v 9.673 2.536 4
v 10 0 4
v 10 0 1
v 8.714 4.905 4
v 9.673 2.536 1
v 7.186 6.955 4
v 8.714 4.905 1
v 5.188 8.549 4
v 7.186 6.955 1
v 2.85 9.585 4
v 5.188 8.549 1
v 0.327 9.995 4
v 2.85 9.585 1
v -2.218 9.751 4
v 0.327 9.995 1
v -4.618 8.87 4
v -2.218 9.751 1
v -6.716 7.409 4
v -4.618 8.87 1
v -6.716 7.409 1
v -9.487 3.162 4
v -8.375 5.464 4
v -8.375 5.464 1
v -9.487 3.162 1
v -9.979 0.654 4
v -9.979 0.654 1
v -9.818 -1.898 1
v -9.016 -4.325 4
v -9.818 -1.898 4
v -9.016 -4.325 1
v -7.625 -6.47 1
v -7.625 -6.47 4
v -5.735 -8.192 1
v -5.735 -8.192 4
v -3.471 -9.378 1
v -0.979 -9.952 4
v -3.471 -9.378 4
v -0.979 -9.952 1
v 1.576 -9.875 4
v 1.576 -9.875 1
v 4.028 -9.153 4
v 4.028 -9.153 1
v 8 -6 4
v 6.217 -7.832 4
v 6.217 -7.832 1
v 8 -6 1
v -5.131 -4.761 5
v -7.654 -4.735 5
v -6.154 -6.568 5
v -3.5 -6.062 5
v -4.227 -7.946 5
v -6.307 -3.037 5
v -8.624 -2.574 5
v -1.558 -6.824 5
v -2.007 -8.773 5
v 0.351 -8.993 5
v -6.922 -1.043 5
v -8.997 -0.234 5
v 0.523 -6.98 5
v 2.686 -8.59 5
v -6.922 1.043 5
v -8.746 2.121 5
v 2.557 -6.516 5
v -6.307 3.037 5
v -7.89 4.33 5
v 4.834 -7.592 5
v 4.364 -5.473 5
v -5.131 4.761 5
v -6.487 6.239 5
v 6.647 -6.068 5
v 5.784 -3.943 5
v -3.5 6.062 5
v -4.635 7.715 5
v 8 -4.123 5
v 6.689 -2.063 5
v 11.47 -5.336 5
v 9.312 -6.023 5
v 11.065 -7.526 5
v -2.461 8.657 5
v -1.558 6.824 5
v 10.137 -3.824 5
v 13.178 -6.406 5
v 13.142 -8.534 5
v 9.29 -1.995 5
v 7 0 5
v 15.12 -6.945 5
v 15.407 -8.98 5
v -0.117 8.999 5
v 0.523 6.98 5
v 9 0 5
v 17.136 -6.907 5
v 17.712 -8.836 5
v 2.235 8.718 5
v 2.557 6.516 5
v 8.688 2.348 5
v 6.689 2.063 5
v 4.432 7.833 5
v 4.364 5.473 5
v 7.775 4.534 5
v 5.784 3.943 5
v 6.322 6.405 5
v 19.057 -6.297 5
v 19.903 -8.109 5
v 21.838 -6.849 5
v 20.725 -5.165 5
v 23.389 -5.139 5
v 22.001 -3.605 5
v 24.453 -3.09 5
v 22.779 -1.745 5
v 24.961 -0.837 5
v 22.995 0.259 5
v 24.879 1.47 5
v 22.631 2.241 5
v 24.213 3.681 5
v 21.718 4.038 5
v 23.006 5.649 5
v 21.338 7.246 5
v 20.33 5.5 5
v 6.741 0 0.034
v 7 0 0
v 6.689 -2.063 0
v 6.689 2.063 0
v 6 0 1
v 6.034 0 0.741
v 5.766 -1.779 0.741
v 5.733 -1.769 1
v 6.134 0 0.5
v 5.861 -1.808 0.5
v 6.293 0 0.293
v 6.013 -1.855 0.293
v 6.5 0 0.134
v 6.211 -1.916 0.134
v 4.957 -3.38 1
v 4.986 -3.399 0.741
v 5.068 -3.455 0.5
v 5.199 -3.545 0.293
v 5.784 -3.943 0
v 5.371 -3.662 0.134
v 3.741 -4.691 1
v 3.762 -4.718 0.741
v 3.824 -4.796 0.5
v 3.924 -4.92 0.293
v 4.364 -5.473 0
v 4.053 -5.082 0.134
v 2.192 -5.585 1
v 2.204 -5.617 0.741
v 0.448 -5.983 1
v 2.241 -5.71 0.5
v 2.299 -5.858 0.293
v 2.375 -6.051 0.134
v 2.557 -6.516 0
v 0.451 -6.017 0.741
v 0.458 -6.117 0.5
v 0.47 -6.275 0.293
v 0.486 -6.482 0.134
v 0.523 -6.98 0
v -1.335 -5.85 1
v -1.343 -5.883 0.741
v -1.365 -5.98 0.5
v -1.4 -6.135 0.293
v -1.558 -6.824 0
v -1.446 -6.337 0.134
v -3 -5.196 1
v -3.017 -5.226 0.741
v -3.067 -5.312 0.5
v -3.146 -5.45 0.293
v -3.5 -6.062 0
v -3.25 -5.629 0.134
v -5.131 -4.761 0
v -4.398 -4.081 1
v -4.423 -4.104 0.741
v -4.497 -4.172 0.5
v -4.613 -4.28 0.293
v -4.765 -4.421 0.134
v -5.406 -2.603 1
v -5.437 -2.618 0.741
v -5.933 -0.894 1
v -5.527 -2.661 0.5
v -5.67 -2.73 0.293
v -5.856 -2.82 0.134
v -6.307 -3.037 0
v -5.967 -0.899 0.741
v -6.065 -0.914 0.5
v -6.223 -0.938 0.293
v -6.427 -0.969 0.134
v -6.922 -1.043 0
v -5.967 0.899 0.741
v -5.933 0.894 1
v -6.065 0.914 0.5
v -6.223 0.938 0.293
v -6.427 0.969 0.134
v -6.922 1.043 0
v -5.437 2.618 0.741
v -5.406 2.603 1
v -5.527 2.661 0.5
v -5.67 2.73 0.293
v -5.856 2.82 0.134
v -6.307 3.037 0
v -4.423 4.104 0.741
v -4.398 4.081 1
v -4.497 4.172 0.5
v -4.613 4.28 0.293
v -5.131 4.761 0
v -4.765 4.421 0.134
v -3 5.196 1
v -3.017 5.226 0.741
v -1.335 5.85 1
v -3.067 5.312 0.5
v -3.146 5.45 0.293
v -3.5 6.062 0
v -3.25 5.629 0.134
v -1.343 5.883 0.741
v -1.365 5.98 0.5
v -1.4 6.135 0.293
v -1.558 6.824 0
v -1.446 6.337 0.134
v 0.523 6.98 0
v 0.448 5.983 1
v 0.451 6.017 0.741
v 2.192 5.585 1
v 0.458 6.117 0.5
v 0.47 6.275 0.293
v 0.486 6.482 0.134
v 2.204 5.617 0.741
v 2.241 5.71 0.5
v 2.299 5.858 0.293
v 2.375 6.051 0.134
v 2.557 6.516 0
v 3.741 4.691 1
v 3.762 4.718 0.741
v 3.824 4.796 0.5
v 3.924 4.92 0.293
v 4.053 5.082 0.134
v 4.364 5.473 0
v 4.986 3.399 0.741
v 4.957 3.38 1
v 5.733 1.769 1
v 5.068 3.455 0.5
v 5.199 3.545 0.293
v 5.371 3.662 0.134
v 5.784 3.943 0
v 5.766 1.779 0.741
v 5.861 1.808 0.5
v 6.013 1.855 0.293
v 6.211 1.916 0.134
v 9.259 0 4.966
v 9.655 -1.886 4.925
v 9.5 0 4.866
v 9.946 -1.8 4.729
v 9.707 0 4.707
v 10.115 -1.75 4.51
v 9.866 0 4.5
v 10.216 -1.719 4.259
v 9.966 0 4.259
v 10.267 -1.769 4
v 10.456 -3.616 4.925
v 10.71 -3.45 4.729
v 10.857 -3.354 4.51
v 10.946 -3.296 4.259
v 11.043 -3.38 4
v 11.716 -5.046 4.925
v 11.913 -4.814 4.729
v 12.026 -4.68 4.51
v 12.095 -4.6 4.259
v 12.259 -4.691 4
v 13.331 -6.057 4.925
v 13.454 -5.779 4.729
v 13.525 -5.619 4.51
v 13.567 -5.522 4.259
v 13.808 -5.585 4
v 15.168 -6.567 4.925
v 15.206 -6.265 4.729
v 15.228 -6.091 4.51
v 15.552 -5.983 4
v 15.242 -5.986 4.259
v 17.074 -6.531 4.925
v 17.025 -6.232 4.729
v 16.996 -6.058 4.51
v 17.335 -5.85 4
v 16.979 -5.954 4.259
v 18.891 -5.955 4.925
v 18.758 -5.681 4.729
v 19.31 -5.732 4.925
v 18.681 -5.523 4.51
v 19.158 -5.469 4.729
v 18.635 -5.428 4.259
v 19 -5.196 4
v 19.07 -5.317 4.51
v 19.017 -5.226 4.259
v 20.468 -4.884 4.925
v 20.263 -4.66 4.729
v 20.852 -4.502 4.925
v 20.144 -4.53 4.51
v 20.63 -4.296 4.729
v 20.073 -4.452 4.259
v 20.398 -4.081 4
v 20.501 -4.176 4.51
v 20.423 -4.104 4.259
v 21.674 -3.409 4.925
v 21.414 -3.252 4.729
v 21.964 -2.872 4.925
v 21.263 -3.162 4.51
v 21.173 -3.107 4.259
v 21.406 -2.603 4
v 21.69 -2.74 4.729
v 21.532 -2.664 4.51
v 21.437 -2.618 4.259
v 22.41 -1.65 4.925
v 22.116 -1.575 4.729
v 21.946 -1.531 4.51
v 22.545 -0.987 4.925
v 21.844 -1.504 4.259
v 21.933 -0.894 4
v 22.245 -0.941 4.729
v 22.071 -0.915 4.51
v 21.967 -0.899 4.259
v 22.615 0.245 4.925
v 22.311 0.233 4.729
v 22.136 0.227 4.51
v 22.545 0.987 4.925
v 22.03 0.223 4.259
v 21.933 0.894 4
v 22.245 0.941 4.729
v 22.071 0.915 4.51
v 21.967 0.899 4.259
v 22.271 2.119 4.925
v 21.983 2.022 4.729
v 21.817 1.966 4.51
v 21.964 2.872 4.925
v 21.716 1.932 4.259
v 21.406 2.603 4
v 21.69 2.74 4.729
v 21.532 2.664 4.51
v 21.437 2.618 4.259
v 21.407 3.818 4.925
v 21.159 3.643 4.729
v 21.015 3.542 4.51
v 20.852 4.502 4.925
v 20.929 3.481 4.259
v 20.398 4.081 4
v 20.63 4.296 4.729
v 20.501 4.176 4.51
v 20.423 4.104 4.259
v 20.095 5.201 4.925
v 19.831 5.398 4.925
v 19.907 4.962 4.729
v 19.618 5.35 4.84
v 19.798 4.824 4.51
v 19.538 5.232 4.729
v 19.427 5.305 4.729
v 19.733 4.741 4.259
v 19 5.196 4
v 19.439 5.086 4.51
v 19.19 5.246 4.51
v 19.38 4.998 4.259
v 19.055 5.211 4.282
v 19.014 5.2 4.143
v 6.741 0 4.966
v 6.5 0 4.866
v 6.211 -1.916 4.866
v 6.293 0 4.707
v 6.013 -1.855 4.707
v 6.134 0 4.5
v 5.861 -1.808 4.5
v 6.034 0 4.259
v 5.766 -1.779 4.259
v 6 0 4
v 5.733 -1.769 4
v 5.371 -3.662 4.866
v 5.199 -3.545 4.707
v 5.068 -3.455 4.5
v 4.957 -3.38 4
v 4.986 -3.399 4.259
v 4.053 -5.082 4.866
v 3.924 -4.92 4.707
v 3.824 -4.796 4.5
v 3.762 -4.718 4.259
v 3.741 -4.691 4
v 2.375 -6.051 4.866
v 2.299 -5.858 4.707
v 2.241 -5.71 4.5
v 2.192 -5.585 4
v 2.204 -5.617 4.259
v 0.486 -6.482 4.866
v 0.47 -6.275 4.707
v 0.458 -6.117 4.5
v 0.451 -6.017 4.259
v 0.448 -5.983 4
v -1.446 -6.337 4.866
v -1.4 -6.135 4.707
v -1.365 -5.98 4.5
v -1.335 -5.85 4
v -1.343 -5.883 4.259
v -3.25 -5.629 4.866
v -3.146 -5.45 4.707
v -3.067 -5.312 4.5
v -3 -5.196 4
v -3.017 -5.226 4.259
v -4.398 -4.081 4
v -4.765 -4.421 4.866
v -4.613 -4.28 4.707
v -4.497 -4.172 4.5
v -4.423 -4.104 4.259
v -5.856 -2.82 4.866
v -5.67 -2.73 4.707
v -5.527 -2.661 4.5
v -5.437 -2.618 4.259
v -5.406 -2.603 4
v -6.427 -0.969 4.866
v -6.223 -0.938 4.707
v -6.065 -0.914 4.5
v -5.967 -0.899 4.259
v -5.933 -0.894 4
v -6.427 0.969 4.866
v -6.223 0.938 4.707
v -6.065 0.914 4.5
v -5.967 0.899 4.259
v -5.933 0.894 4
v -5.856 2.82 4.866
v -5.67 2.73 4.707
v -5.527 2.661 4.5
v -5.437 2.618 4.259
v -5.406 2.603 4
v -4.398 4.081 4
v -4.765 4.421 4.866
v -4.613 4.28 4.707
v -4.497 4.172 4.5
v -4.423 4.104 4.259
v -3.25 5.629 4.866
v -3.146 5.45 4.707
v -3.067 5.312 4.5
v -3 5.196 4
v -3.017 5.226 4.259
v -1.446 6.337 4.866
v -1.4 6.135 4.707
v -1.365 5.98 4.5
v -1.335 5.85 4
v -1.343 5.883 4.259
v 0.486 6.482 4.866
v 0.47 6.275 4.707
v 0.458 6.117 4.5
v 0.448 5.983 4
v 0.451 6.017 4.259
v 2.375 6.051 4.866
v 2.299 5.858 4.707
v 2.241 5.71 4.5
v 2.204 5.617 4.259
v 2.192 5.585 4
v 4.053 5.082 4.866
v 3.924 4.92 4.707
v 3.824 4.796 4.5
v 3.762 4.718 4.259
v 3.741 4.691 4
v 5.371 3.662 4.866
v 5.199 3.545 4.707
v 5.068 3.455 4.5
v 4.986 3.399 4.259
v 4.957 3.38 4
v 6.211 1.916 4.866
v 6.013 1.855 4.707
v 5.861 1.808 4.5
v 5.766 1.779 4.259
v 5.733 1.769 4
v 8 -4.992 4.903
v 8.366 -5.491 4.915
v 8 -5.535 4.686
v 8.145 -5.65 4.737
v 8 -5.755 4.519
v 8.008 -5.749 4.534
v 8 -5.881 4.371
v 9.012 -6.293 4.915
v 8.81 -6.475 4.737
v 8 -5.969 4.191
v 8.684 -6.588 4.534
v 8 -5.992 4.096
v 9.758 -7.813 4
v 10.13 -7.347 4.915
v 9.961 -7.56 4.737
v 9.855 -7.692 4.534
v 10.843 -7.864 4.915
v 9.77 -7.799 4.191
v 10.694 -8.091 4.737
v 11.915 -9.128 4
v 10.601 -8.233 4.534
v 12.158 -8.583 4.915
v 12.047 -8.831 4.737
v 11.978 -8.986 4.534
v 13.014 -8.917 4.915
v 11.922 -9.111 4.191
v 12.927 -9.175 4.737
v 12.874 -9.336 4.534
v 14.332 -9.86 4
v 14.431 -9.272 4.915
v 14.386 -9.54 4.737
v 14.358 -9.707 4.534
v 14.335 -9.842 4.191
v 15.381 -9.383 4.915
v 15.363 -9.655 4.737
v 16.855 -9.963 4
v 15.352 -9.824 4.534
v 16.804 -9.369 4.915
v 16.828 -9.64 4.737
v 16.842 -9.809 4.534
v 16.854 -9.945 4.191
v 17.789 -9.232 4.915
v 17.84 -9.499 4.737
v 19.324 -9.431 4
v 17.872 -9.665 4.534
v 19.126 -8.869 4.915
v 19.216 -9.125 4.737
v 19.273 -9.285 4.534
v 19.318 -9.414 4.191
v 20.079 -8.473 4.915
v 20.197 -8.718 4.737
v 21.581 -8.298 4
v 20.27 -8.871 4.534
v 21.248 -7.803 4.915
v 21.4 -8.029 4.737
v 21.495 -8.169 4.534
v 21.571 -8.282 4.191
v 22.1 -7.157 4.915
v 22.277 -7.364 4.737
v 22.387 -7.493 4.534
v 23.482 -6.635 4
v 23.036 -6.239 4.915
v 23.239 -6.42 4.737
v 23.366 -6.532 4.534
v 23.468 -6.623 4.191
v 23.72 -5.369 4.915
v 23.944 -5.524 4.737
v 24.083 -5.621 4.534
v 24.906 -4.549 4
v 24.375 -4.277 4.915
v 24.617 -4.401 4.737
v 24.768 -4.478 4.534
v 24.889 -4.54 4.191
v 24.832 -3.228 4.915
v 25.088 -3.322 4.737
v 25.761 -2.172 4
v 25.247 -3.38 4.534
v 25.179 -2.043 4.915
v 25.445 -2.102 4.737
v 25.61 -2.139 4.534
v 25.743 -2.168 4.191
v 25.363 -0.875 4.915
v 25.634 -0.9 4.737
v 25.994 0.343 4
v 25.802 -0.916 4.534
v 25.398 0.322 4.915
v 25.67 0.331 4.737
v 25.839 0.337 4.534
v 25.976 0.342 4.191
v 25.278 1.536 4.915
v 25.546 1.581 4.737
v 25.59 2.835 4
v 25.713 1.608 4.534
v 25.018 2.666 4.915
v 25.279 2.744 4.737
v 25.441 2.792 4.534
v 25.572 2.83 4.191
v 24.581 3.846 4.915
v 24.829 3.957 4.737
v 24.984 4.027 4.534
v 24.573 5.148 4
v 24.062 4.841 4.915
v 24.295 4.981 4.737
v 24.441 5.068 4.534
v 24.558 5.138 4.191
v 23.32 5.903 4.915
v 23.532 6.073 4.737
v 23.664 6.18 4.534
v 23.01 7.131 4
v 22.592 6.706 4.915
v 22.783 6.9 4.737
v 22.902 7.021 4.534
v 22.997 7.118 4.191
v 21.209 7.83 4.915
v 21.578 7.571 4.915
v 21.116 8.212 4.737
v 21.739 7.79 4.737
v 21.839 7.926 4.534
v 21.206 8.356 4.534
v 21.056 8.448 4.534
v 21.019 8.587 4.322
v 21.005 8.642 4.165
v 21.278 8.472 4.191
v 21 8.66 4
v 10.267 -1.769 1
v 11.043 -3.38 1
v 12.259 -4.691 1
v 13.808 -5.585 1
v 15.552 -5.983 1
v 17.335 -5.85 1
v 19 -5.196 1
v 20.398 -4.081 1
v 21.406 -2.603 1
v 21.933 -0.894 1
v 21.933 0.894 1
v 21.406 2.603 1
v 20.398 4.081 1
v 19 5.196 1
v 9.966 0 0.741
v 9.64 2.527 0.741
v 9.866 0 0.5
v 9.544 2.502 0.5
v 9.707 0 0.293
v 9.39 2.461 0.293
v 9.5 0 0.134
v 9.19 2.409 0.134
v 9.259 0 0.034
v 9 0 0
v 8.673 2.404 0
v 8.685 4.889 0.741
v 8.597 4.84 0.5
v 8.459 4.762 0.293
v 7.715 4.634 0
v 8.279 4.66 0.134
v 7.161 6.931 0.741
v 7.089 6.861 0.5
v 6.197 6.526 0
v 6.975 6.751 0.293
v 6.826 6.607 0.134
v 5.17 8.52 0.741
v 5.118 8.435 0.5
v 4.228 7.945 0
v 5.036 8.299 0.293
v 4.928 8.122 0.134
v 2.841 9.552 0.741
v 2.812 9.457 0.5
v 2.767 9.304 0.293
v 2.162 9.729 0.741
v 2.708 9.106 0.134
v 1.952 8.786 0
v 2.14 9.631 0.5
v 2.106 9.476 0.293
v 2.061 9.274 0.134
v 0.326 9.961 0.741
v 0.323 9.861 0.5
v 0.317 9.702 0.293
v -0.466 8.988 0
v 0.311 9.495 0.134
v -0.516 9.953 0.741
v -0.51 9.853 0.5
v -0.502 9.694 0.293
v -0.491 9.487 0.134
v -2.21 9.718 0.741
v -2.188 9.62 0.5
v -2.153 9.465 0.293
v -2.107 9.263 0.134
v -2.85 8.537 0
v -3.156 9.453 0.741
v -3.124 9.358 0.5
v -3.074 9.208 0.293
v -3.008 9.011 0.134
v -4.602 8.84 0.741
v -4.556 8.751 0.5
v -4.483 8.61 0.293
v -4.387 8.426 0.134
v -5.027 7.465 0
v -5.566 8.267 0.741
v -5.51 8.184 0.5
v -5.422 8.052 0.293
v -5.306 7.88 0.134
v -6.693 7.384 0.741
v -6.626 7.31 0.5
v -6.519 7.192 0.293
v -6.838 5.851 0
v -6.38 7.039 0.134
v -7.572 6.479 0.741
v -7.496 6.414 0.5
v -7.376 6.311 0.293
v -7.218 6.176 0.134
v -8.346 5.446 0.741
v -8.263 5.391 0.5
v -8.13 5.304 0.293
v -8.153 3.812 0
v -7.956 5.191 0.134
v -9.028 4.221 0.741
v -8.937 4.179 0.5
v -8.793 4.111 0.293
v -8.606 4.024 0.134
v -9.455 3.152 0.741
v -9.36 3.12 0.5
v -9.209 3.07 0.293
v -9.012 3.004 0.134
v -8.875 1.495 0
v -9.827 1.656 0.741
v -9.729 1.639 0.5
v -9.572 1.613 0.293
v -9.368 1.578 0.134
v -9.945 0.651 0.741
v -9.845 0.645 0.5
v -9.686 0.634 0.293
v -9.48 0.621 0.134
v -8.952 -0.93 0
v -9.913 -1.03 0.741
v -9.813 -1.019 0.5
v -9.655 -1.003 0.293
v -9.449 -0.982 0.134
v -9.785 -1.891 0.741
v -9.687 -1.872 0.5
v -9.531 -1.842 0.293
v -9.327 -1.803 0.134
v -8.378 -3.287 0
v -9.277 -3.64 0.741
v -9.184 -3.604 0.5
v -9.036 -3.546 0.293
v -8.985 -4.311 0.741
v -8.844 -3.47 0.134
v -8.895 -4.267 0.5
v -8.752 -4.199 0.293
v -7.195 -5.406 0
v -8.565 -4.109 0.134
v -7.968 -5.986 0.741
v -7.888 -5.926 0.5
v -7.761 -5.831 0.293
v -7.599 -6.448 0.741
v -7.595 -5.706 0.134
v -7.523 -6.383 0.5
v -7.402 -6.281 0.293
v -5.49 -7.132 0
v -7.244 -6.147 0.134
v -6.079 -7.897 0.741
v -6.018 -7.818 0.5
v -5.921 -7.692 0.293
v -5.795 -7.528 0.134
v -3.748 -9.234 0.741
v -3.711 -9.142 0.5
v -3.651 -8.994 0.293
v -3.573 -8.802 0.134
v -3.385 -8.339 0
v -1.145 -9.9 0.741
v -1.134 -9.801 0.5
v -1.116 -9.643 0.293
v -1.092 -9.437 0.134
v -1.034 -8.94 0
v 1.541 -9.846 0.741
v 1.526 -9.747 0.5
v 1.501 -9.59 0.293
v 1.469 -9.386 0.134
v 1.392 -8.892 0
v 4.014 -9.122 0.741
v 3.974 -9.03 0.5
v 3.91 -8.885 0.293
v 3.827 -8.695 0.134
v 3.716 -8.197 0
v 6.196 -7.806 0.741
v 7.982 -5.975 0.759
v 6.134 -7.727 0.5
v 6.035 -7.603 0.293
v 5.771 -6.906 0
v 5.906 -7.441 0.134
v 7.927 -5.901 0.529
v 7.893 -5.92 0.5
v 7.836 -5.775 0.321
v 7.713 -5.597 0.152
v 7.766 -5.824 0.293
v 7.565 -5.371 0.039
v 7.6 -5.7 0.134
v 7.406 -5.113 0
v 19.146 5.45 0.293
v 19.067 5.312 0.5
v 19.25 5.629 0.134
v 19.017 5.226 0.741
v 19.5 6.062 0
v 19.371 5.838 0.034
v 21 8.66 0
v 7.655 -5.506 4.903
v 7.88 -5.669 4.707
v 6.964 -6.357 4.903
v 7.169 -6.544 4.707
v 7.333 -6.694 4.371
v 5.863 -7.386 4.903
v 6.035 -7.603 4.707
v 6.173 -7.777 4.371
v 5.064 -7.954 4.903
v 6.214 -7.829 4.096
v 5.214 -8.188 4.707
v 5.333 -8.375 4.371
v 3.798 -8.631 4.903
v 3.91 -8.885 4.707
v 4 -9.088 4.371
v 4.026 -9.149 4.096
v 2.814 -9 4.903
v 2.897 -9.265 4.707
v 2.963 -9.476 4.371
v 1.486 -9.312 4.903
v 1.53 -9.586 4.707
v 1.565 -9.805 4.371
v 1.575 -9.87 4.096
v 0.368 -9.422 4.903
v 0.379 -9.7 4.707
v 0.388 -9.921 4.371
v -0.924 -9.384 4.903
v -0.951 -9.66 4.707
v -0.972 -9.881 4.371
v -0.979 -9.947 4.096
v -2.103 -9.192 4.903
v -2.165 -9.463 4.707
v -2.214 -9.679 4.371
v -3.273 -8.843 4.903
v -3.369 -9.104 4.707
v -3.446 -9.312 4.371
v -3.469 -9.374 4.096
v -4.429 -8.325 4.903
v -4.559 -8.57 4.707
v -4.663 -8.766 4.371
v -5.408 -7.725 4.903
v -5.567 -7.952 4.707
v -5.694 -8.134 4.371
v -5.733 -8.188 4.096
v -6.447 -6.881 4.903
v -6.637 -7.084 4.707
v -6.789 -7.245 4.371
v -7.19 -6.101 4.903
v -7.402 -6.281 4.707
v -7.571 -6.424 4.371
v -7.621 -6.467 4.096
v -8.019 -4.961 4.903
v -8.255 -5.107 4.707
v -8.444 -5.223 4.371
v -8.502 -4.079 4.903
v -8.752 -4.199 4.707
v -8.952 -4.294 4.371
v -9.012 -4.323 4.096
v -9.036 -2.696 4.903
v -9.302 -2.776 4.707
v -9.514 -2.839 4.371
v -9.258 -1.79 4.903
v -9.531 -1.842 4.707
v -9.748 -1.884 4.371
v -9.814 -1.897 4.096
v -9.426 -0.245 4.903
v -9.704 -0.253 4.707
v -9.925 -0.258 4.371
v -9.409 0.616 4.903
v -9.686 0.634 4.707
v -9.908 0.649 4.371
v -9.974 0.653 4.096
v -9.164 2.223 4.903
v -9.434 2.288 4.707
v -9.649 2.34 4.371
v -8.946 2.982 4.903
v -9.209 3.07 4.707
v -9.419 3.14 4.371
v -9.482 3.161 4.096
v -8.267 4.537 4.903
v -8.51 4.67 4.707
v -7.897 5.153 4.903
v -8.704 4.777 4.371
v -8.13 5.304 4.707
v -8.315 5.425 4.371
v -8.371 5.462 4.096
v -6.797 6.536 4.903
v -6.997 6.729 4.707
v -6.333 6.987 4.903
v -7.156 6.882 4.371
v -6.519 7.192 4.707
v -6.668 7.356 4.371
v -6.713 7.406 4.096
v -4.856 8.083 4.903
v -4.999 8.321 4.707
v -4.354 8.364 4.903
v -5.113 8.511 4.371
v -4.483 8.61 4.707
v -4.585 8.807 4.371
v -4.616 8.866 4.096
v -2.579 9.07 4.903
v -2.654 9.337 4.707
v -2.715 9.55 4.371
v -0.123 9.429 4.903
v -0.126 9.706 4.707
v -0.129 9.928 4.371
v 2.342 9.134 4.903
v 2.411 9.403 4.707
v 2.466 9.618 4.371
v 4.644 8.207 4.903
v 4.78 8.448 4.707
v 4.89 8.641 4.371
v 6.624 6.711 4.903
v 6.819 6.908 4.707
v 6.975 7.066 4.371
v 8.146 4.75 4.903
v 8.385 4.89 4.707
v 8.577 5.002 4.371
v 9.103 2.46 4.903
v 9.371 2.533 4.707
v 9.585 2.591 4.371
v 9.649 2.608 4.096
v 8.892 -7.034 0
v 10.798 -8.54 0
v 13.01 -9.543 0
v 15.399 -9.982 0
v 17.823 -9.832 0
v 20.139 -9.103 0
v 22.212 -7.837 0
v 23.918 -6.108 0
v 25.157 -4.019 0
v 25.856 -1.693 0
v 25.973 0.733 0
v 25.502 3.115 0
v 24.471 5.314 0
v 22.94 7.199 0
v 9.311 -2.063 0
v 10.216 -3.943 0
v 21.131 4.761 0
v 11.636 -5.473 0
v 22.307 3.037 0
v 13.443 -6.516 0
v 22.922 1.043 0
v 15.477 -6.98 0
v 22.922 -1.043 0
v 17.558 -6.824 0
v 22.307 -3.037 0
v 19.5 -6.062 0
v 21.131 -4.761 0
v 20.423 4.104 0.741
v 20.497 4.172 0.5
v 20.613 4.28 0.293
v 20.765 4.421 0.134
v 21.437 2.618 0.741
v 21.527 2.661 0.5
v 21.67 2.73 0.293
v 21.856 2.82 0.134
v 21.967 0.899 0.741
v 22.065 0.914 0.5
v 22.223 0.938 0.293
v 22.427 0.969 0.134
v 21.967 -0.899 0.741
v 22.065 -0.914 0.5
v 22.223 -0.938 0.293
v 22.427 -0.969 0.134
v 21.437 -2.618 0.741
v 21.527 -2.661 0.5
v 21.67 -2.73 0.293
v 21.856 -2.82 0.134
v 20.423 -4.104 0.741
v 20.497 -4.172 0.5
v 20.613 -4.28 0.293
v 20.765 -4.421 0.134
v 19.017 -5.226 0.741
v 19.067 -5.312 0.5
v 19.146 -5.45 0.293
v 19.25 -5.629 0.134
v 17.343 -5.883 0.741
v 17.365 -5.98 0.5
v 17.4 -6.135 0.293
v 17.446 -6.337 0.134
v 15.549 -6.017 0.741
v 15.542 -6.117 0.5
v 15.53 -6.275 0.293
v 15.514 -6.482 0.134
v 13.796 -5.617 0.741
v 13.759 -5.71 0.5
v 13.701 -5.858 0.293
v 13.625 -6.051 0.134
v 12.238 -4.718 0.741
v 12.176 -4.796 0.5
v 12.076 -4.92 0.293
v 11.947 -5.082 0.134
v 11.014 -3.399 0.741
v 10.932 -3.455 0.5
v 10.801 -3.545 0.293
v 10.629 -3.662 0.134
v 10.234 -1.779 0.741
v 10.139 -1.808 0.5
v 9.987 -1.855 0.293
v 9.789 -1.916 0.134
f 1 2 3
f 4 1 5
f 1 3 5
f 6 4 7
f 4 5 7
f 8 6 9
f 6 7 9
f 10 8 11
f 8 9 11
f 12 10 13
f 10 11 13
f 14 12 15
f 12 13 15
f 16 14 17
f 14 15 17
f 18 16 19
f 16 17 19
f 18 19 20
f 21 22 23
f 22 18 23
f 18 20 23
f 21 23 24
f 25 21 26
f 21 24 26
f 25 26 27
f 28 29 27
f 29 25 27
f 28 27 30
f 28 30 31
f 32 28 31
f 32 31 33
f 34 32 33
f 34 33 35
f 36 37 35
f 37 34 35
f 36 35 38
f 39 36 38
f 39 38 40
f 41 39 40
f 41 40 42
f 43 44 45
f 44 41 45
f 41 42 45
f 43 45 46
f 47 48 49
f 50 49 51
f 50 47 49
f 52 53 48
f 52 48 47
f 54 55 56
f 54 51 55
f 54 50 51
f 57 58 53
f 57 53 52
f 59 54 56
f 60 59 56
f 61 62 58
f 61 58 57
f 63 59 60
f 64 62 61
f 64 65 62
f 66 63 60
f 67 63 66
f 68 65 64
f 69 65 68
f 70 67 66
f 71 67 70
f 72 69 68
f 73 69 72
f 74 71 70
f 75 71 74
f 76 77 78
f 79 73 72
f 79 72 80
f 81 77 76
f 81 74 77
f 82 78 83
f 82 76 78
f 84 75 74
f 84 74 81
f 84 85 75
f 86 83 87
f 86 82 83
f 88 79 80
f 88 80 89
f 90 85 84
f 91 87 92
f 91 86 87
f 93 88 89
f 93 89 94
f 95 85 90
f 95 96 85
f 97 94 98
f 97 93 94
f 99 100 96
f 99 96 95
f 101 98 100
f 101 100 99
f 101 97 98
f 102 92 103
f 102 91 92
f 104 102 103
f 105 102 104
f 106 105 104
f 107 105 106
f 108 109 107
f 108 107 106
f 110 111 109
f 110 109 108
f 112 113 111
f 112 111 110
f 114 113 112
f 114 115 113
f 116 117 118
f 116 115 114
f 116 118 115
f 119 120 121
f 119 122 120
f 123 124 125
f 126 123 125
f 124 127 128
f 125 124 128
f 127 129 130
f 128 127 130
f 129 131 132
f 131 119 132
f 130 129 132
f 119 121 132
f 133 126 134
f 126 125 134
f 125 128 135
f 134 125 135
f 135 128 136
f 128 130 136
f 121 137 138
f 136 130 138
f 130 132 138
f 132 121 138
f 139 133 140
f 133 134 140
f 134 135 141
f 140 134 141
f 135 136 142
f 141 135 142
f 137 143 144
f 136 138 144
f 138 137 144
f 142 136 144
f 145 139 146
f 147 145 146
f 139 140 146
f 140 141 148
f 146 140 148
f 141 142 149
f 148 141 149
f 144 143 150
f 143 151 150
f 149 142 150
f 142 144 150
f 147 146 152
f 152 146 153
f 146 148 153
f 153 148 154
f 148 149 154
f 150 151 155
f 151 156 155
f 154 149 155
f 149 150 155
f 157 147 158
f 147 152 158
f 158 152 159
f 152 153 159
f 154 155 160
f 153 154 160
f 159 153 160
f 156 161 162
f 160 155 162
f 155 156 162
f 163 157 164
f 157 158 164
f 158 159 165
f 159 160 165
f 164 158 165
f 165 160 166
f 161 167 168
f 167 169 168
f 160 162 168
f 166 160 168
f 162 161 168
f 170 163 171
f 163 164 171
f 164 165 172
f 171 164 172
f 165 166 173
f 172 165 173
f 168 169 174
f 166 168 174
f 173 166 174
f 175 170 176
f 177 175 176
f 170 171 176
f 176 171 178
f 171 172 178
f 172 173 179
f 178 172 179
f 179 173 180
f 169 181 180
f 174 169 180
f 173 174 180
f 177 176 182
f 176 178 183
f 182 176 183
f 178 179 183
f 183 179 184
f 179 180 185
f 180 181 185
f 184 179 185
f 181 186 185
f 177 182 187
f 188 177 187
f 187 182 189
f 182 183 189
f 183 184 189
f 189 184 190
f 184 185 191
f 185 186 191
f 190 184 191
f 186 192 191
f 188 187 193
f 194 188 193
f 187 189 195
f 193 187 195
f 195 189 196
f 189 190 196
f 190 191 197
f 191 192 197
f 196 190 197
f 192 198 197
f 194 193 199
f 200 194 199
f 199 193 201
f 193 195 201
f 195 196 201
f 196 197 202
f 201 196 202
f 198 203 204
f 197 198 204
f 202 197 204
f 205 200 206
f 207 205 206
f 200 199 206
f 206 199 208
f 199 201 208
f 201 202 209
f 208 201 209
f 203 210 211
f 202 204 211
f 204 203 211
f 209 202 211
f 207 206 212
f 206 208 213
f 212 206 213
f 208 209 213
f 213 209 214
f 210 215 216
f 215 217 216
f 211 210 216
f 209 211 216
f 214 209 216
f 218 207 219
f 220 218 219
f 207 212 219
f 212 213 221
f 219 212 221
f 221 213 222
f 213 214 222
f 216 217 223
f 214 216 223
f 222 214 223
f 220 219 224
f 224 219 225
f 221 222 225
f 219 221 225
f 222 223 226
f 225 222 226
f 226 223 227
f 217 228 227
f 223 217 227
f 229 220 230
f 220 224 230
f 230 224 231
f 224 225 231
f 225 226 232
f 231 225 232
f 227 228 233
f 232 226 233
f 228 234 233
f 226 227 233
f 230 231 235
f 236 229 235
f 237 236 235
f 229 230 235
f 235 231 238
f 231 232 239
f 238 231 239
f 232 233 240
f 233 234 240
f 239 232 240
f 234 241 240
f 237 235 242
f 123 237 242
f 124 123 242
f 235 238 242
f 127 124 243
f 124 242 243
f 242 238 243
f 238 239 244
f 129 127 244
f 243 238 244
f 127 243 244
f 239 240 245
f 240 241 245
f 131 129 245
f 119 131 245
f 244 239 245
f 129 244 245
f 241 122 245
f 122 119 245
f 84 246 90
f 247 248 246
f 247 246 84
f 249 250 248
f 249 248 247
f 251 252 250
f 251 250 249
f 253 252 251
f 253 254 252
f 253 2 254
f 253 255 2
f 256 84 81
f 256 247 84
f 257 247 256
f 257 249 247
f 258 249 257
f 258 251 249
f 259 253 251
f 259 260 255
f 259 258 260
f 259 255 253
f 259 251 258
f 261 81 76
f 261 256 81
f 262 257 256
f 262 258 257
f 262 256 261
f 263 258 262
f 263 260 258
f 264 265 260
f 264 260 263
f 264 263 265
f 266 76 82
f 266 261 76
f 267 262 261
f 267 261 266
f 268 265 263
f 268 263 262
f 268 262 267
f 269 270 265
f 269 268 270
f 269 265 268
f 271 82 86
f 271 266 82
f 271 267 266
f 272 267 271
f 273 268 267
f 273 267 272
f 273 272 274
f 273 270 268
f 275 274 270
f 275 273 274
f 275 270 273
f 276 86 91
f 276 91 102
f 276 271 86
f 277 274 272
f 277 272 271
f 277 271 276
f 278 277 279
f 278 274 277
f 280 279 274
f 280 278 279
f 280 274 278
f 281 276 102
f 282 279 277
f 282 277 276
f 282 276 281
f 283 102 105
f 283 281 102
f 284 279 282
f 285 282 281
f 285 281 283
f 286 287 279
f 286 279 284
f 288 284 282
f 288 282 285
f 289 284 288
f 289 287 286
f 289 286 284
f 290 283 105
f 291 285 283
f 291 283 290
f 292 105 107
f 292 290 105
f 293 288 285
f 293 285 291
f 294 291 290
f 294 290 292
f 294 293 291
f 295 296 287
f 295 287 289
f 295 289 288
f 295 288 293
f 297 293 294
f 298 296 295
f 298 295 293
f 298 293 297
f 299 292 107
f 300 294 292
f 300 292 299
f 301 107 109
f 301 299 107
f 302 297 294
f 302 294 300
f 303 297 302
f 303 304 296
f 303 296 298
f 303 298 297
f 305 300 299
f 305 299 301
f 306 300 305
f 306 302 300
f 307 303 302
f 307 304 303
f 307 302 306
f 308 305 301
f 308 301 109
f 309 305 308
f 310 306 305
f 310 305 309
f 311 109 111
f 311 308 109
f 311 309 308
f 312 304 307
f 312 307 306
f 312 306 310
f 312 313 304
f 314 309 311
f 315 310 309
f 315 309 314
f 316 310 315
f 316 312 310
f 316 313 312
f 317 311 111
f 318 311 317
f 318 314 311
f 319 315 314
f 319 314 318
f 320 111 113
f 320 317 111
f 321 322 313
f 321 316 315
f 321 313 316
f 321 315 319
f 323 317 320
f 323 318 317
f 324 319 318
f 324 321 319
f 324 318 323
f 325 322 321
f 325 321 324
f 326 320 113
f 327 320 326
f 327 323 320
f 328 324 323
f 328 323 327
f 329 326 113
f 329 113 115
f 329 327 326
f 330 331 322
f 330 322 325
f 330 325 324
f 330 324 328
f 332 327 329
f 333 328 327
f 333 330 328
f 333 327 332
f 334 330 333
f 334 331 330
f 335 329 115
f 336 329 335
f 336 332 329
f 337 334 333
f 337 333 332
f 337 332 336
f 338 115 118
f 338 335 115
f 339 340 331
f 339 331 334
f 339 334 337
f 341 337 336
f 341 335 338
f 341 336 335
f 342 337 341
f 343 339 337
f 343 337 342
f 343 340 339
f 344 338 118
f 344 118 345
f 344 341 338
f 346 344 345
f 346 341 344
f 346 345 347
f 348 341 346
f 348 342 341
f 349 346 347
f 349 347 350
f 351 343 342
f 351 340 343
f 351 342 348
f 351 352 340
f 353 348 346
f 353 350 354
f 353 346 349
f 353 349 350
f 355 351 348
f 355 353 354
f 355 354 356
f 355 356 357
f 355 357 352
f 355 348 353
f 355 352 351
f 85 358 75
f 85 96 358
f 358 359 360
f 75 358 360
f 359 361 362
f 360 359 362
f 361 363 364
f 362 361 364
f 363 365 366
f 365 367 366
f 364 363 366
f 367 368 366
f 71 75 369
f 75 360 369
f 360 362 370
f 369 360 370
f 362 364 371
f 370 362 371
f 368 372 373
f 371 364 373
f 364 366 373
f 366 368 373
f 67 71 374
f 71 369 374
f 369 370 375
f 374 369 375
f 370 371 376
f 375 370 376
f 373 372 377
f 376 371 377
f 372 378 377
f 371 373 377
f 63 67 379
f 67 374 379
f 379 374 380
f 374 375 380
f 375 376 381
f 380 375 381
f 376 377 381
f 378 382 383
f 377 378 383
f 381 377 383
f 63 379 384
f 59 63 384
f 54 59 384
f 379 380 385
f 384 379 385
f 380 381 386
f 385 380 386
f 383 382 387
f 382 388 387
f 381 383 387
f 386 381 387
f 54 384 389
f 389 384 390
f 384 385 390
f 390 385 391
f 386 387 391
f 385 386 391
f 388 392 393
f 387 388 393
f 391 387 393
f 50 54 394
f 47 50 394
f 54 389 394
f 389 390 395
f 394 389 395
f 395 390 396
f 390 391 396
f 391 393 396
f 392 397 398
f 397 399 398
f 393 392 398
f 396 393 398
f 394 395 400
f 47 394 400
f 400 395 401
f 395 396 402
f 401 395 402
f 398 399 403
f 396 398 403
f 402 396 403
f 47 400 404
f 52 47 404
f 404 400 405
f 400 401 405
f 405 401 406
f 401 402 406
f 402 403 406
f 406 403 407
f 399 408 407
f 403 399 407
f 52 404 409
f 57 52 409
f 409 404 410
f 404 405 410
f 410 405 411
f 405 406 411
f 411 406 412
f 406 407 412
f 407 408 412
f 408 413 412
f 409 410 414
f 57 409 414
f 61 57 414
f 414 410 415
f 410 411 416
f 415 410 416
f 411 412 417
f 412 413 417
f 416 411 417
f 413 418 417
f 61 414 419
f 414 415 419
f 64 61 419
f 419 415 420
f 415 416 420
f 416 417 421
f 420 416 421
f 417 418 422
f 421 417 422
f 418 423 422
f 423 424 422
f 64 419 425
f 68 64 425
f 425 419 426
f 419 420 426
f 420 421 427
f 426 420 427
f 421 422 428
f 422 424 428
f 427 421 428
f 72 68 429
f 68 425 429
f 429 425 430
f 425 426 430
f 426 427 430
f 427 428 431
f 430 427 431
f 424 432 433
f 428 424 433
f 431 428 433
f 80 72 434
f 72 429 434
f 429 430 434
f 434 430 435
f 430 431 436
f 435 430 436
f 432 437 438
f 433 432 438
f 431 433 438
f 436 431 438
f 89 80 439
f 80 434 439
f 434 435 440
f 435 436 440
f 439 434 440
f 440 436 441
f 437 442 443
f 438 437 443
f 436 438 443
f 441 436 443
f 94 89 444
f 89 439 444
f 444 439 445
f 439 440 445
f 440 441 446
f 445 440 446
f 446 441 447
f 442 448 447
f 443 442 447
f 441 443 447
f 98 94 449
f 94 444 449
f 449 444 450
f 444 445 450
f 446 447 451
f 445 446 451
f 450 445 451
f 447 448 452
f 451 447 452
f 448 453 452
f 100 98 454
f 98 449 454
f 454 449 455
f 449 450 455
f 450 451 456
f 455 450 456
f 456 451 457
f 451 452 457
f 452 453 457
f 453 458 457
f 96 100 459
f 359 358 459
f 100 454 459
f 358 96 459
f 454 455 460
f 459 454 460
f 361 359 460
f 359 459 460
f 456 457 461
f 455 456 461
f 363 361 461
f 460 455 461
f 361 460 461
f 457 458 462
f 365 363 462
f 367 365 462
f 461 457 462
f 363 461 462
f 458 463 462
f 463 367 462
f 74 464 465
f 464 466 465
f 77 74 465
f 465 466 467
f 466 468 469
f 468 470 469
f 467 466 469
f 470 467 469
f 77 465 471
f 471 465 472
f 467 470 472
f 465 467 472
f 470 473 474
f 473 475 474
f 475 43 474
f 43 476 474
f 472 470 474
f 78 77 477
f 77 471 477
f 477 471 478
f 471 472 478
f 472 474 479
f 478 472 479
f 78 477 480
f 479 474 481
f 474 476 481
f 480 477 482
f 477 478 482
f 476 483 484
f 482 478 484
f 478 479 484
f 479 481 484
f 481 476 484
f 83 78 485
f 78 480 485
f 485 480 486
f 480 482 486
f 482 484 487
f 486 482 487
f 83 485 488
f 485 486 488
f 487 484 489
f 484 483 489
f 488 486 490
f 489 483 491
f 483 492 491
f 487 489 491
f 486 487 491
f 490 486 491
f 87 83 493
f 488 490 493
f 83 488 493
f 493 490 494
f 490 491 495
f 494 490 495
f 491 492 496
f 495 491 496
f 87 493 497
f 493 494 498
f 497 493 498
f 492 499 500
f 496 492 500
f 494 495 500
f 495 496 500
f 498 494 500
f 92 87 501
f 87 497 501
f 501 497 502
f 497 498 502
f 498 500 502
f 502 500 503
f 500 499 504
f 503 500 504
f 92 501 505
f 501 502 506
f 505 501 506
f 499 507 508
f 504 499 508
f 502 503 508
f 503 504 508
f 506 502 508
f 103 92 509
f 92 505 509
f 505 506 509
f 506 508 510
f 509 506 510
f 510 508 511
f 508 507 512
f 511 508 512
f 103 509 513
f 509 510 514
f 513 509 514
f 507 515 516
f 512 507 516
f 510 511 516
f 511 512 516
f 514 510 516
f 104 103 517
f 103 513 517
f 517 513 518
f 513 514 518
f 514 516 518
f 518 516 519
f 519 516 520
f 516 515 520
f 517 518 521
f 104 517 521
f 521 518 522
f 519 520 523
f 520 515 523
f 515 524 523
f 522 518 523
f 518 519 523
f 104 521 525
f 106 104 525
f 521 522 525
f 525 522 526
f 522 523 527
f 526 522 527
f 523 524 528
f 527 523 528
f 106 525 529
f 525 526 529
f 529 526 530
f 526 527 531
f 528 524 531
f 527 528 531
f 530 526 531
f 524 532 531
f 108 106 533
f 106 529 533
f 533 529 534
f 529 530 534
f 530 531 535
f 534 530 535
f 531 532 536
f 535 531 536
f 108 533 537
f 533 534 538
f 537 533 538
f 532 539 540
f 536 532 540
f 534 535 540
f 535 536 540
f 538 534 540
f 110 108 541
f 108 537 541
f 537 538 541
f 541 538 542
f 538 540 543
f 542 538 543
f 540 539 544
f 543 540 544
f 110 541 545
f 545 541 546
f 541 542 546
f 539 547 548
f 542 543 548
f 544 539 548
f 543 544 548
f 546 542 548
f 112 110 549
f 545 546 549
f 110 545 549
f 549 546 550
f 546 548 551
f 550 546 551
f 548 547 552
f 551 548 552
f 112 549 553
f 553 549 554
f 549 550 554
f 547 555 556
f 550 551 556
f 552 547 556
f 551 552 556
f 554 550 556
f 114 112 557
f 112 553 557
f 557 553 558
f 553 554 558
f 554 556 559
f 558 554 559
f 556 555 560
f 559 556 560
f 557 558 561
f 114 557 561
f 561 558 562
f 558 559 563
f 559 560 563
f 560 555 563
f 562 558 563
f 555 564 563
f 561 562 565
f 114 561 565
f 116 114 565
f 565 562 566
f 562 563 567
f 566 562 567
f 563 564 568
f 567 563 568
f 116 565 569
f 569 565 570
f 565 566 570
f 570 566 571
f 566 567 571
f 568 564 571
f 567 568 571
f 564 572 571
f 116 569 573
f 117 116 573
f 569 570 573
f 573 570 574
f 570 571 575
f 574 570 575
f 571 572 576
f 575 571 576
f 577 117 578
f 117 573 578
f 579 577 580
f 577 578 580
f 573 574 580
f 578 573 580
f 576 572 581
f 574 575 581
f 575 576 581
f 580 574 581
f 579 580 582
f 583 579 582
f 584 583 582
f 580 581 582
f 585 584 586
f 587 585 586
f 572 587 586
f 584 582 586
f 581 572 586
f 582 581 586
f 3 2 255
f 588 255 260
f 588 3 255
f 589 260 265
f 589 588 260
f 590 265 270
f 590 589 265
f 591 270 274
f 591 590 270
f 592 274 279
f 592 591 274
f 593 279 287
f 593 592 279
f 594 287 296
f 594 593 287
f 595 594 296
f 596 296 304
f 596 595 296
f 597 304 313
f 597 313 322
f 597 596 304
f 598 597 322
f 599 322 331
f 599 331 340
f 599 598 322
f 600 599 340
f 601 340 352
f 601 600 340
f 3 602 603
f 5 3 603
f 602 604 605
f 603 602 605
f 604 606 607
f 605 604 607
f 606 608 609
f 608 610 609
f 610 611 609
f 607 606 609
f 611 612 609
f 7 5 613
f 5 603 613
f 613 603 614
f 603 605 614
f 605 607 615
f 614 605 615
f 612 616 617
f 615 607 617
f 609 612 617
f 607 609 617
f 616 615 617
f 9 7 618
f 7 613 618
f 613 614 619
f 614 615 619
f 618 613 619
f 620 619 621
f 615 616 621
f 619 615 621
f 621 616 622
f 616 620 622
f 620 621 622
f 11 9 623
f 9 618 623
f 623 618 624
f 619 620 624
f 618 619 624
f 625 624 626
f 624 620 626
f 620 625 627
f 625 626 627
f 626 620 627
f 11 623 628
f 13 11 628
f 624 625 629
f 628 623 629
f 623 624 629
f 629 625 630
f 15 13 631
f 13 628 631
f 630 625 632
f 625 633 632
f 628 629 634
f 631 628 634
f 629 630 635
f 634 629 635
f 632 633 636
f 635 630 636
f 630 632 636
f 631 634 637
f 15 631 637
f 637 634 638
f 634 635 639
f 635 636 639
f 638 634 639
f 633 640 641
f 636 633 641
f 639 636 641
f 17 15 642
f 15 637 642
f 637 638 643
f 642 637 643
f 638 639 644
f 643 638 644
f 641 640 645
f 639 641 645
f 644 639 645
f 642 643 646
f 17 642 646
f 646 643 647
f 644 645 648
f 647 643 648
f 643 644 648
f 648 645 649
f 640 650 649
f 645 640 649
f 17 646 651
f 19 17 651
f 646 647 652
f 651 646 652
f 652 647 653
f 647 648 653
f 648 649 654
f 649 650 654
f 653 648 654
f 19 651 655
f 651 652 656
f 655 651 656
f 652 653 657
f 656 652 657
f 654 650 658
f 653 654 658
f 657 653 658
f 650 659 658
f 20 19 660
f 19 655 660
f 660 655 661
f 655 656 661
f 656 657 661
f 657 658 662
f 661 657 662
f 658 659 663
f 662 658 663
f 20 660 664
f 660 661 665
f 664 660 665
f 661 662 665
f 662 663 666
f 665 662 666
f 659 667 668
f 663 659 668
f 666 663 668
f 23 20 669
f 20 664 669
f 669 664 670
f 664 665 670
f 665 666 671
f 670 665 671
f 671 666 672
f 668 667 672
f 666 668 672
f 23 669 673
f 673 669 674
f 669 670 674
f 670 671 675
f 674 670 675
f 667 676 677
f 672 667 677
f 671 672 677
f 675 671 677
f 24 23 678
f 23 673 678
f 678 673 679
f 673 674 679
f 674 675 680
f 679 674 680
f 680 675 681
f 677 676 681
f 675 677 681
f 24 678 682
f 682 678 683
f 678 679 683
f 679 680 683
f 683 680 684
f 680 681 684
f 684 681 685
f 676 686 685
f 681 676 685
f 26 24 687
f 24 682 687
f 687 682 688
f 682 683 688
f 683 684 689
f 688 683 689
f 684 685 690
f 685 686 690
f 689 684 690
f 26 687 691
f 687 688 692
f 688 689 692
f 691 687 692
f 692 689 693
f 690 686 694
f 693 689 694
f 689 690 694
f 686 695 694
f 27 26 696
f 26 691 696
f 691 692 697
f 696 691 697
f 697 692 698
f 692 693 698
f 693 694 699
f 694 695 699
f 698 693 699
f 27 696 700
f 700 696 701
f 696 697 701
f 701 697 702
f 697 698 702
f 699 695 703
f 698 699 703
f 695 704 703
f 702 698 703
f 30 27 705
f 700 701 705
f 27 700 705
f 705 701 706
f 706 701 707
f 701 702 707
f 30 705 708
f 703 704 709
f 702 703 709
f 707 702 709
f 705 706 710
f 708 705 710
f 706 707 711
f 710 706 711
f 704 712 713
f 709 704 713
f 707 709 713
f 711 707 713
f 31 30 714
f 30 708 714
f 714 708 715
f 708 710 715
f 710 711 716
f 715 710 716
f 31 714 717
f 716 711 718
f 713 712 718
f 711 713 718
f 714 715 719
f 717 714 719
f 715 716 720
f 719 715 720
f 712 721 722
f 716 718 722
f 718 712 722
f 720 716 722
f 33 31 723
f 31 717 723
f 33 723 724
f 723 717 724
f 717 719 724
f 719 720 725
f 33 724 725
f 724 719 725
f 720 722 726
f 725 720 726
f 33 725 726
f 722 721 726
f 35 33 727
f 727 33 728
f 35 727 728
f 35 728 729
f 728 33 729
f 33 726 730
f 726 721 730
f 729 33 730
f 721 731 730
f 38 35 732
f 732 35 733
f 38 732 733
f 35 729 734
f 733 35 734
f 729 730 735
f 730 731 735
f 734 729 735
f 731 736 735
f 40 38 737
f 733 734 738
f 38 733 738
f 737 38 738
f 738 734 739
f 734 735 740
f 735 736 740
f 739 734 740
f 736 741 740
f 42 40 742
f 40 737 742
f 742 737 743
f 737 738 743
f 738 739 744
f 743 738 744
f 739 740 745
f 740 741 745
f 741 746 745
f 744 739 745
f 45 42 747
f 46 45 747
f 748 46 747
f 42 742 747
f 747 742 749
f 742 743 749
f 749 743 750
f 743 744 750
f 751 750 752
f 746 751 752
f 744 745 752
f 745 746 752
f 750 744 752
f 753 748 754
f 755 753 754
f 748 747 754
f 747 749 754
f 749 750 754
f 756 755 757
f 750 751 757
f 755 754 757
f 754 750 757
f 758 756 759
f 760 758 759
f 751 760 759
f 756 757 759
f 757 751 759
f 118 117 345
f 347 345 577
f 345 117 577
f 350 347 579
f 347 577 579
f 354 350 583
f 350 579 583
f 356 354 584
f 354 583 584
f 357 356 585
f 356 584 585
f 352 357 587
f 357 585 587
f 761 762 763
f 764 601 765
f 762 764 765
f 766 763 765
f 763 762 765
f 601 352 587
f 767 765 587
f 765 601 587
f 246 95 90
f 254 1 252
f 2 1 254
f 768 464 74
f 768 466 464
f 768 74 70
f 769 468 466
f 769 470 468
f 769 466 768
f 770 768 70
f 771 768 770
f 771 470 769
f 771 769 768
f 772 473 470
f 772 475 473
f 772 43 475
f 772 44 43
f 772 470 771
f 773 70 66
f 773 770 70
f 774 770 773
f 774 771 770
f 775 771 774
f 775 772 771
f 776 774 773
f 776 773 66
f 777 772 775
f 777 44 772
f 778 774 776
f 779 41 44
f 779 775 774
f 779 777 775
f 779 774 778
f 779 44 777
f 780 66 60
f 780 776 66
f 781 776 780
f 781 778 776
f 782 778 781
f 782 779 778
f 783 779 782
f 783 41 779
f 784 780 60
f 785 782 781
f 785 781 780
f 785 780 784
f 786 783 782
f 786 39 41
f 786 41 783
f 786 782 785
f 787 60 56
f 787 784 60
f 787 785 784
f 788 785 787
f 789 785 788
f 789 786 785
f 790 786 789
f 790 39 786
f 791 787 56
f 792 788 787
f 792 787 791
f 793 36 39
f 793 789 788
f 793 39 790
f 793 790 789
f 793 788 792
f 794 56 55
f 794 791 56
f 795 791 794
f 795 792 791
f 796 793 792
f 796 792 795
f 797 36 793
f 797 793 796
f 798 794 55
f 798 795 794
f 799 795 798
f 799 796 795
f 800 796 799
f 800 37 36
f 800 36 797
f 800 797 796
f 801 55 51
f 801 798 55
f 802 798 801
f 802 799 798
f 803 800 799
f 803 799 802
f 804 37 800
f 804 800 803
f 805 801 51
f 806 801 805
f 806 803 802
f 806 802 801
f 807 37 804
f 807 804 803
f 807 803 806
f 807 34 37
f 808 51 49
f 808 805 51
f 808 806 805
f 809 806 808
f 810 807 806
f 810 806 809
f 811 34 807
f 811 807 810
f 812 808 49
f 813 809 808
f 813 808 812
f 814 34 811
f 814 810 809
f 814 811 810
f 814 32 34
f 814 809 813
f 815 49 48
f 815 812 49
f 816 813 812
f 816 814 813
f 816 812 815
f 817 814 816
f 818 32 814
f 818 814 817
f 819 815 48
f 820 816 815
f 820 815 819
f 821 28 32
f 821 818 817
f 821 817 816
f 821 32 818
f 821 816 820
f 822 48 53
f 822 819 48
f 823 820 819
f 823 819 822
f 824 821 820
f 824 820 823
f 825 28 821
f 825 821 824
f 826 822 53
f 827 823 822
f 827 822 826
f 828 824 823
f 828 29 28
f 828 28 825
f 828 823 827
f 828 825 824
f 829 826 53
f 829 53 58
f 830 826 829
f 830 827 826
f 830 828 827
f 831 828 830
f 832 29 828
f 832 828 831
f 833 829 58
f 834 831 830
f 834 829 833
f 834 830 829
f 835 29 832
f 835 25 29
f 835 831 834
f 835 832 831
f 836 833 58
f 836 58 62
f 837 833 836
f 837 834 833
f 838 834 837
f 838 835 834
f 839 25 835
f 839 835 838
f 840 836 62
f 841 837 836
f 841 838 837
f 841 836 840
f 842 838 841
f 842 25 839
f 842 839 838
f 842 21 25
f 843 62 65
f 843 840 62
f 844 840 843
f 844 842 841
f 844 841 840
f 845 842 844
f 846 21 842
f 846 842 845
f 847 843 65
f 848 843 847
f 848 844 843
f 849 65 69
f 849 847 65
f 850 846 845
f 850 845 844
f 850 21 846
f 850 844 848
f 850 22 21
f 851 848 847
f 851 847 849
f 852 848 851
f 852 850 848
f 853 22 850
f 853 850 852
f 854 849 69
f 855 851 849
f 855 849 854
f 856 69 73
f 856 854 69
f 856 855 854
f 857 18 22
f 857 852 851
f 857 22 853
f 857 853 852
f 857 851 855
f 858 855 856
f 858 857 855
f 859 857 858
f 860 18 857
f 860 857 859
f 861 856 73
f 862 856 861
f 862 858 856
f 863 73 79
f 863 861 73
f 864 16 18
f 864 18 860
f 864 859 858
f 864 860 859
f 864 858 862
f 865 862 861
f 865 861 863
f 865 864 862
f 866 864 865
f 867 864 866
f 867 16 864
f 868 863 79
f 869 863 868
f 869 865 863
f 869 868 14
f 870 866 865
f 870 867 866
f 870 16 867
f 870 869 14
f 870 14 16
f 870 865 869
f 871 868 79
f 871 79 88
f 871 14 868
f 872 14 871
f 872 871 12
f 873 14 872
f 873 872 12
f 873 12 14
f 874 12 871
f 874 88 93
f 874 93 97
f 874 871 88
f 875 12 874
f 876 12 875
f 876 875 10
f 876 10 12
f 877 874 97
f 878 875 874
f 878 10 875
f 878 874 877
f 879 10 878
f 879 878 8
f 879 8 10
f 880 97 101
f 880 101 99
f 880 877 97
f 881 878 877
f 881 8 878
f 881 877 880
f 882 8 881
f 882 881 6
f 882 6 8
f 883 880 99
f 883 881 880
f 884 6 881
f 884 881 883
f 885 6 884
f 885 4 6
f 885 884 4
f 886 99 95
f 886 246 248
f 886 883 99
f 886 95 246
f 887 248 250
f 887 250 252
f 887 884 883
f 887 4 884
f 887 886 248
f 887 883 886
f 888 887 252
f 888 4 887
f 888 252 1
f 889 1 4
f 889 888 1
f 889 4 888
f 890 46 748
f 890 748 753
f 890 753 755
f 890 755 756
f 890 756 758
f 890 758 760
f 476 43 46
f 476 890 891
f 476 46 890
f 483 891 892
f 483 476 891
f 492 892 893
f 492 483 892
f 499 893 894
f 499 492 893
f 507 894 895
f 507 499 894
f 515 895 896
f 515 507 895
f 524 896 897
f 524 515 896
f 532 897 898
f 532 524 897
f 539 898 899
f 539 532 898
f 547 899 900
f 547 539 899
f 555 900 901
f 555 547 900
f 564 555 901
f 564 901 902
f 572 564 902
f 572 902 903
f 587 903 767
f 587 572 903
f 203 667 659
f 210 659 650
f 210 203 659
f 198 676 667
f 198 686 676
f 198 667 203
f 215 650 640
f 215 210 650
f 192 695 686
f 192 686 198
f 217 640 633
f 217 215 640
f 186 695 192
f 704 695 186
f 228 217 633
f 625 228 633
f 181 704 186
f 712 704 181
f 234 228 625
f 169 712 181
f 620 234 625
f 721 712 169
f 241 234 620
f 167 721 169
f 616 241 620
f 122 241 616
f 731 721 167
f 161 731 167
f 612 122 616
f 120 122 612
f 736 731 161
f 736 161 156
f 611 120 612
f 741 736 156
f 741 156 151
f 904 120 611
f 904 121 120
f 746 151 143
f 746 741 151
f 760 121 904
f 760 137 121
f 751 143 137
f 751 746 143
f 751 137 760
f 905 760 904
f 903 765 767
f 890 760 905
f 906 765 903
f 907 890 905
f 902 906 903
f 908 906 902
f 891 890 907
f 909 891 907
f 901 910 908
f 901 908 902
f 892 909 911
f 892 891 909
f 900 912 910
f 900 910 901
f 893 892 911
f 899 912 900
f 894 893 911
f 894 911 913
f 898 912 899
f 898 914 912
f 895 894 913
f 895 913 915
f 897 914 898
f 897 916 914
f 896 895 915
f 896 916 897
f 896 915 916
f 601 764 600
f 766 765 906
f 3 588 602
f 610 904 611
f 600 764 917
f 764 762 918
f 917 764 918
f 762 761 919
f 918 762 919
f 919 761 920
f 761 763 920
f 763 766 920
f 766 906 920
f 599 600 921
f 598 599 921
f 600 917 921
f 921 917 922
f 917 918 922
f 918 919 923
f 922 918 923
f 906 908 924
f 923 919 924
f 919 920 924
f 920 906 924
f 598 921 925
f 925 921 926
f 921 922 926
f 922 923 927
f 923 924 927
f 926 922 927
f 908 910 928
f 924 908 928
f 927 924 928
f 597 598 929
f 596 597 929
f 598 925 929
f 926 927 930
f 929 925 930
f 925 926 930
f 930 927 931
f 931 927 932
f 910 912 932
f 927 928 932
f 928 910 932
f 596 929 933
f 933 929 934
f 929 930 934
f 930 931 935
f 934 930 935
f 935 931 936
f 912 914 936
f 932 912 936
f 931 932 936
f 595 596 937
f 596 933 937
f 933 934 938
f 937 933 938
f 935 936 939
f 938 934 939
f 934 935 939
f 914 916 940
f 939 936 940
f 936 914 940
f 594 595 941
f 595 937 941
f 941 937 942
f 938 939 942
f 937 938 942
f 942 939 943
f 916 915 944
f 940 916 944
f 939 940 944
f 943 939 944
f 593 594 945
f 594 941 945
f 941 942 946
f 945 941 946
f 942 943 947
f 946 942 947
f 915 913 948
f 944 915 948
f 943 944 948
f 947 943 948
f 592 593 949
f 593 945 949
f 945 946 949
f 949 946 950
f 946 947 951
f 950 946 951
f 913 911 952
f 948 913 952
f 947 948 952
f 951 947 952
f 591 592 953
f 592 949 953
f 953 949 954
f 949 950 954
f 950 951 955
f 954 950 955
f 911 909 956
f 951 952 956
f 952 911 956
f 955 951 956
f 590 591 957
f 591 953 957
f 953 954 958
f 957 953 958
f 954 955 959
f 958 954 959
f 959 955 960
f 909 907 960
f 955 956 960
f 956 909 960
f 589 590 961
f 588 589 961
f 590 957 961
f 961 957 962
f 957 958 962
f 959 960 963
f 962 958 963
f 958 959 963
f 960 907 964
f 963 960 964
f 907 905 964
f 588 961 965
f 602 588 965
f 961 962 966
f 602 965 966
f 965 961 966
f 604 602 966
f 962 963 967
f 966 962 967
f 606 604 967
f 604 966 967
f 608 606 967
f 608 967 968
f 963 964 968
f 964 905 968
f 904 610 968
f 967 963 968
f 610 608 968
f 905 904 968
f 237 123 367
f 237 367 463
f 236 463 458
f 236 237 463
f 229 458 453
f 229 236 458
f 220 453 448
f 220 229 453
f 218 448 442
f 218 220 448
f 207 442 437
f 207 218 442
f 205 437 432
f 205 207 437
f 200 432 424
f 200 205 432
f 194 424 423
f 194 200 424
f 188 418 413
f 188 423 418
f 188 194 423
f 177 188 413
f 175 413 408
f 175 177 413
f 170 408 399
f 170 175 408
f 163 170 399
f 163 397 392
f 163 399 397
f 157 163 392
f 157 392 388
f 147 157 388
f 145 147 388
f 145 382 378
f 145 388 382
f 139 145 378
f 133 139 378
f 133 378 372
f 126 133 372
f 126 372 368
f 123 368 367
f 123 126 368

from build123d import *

# Parameters (mm, degrees)
CYLINDER003_R     = 6
CYLINDER003_DEPTH = 10
CYLINDER002_W     = 10
CYLINDER002_H     = 5
CYLINDER002_ANGLE = 240
CYLINDER001_R     = 6
CYLINDER001_DEPTH = 10
CYLINDER_R        = 10
CYLINDER_DEPTH    = 5
FILLET_R          = 1
FILLET001_R       = 1
FILLET002_R       = 1


with BuildPart() as resta_garfio:
    # Cylinder003 → Cylinder003 (new body)
    with BuildSketch(Plane(origin=(16, 0, -3), x_dir=(1, 0, 0), z_dir=(0, 0, 1))):
        Circle(CYLINDER003_R)
    extrude(amount=CYLINDER003_DEPTH)


with BuildPart() as garfio_hueco:
    # Cylinder002 → Cylinder002 (revolve)
    with BuildSketch(Plane(origin=(16, 0, 0), x_dir=(-1, 0, 0), z_dir=(0, 1, 0))):
        with Locations((5, 2.5)):
            Rectangle(CYLINDER002_W, CYLINDER002_H)
    revolve(axis=Axis((16, 0, 0), (0, 0, 1)), revolution_arc=CYLINDER002_ANGLE)

    # Cut001: cut resta_garfio
    add(resta_garfio.part, mode=Mode.SUBTRACT)


with BuildPart() as resta_base:
    # Cylinder001 → Cylinder001 (new body)
    with BuildSketch(Plane.XY.offset(-3)):
        Circle(CYLINDER001_R)
    extrude(amount=CYLINDER001_DEPTH)


with BuildPart() as fillet002:
    # Cylinder → Cylinder (new body)
    with BuildSketch(Plane.XY):
        Circle(CYLINDER_R)
    extrude(amount=CYLINDER_DEPTH)

    # Cut: cut resta_base
    add(resta_base.part, mode=Mode.SUBTRACT)

    # Fusion: union garfio_hueco
    add(garfio_hueco.part)

    # Fillet
    fillet_edges = [fillet002.edges().sort_by_distance(p)[0] for p in [
        (20, 6.928203, 5),
        (23.482029, -6.6347, 5),
        (21.196152, 3, 5),
        (16, -6, 5),
        (-9.486833, 3.162278, 5),
    ]]
    fillet(fillet_edges, radius=FILLET_R)

    # Fillet001
    fillet001_edges = [fillet002.edges().sort_by_distance(p)[0] for p in [
        (-6, 0, 0),
        (-6, 0, 5),
    ]]
    fillet(fillet001_edges, radius=FILLET001_R)

    # Fillet002
    fillet002_edges = [fillet002.edges().sort_by_distance(p)[0] for p in [
        (-9.486833, 3.162278, 0),
    ]]
    fillet(fillet002_edges, radius=FILLET002_R)


solid = fillet002.part
